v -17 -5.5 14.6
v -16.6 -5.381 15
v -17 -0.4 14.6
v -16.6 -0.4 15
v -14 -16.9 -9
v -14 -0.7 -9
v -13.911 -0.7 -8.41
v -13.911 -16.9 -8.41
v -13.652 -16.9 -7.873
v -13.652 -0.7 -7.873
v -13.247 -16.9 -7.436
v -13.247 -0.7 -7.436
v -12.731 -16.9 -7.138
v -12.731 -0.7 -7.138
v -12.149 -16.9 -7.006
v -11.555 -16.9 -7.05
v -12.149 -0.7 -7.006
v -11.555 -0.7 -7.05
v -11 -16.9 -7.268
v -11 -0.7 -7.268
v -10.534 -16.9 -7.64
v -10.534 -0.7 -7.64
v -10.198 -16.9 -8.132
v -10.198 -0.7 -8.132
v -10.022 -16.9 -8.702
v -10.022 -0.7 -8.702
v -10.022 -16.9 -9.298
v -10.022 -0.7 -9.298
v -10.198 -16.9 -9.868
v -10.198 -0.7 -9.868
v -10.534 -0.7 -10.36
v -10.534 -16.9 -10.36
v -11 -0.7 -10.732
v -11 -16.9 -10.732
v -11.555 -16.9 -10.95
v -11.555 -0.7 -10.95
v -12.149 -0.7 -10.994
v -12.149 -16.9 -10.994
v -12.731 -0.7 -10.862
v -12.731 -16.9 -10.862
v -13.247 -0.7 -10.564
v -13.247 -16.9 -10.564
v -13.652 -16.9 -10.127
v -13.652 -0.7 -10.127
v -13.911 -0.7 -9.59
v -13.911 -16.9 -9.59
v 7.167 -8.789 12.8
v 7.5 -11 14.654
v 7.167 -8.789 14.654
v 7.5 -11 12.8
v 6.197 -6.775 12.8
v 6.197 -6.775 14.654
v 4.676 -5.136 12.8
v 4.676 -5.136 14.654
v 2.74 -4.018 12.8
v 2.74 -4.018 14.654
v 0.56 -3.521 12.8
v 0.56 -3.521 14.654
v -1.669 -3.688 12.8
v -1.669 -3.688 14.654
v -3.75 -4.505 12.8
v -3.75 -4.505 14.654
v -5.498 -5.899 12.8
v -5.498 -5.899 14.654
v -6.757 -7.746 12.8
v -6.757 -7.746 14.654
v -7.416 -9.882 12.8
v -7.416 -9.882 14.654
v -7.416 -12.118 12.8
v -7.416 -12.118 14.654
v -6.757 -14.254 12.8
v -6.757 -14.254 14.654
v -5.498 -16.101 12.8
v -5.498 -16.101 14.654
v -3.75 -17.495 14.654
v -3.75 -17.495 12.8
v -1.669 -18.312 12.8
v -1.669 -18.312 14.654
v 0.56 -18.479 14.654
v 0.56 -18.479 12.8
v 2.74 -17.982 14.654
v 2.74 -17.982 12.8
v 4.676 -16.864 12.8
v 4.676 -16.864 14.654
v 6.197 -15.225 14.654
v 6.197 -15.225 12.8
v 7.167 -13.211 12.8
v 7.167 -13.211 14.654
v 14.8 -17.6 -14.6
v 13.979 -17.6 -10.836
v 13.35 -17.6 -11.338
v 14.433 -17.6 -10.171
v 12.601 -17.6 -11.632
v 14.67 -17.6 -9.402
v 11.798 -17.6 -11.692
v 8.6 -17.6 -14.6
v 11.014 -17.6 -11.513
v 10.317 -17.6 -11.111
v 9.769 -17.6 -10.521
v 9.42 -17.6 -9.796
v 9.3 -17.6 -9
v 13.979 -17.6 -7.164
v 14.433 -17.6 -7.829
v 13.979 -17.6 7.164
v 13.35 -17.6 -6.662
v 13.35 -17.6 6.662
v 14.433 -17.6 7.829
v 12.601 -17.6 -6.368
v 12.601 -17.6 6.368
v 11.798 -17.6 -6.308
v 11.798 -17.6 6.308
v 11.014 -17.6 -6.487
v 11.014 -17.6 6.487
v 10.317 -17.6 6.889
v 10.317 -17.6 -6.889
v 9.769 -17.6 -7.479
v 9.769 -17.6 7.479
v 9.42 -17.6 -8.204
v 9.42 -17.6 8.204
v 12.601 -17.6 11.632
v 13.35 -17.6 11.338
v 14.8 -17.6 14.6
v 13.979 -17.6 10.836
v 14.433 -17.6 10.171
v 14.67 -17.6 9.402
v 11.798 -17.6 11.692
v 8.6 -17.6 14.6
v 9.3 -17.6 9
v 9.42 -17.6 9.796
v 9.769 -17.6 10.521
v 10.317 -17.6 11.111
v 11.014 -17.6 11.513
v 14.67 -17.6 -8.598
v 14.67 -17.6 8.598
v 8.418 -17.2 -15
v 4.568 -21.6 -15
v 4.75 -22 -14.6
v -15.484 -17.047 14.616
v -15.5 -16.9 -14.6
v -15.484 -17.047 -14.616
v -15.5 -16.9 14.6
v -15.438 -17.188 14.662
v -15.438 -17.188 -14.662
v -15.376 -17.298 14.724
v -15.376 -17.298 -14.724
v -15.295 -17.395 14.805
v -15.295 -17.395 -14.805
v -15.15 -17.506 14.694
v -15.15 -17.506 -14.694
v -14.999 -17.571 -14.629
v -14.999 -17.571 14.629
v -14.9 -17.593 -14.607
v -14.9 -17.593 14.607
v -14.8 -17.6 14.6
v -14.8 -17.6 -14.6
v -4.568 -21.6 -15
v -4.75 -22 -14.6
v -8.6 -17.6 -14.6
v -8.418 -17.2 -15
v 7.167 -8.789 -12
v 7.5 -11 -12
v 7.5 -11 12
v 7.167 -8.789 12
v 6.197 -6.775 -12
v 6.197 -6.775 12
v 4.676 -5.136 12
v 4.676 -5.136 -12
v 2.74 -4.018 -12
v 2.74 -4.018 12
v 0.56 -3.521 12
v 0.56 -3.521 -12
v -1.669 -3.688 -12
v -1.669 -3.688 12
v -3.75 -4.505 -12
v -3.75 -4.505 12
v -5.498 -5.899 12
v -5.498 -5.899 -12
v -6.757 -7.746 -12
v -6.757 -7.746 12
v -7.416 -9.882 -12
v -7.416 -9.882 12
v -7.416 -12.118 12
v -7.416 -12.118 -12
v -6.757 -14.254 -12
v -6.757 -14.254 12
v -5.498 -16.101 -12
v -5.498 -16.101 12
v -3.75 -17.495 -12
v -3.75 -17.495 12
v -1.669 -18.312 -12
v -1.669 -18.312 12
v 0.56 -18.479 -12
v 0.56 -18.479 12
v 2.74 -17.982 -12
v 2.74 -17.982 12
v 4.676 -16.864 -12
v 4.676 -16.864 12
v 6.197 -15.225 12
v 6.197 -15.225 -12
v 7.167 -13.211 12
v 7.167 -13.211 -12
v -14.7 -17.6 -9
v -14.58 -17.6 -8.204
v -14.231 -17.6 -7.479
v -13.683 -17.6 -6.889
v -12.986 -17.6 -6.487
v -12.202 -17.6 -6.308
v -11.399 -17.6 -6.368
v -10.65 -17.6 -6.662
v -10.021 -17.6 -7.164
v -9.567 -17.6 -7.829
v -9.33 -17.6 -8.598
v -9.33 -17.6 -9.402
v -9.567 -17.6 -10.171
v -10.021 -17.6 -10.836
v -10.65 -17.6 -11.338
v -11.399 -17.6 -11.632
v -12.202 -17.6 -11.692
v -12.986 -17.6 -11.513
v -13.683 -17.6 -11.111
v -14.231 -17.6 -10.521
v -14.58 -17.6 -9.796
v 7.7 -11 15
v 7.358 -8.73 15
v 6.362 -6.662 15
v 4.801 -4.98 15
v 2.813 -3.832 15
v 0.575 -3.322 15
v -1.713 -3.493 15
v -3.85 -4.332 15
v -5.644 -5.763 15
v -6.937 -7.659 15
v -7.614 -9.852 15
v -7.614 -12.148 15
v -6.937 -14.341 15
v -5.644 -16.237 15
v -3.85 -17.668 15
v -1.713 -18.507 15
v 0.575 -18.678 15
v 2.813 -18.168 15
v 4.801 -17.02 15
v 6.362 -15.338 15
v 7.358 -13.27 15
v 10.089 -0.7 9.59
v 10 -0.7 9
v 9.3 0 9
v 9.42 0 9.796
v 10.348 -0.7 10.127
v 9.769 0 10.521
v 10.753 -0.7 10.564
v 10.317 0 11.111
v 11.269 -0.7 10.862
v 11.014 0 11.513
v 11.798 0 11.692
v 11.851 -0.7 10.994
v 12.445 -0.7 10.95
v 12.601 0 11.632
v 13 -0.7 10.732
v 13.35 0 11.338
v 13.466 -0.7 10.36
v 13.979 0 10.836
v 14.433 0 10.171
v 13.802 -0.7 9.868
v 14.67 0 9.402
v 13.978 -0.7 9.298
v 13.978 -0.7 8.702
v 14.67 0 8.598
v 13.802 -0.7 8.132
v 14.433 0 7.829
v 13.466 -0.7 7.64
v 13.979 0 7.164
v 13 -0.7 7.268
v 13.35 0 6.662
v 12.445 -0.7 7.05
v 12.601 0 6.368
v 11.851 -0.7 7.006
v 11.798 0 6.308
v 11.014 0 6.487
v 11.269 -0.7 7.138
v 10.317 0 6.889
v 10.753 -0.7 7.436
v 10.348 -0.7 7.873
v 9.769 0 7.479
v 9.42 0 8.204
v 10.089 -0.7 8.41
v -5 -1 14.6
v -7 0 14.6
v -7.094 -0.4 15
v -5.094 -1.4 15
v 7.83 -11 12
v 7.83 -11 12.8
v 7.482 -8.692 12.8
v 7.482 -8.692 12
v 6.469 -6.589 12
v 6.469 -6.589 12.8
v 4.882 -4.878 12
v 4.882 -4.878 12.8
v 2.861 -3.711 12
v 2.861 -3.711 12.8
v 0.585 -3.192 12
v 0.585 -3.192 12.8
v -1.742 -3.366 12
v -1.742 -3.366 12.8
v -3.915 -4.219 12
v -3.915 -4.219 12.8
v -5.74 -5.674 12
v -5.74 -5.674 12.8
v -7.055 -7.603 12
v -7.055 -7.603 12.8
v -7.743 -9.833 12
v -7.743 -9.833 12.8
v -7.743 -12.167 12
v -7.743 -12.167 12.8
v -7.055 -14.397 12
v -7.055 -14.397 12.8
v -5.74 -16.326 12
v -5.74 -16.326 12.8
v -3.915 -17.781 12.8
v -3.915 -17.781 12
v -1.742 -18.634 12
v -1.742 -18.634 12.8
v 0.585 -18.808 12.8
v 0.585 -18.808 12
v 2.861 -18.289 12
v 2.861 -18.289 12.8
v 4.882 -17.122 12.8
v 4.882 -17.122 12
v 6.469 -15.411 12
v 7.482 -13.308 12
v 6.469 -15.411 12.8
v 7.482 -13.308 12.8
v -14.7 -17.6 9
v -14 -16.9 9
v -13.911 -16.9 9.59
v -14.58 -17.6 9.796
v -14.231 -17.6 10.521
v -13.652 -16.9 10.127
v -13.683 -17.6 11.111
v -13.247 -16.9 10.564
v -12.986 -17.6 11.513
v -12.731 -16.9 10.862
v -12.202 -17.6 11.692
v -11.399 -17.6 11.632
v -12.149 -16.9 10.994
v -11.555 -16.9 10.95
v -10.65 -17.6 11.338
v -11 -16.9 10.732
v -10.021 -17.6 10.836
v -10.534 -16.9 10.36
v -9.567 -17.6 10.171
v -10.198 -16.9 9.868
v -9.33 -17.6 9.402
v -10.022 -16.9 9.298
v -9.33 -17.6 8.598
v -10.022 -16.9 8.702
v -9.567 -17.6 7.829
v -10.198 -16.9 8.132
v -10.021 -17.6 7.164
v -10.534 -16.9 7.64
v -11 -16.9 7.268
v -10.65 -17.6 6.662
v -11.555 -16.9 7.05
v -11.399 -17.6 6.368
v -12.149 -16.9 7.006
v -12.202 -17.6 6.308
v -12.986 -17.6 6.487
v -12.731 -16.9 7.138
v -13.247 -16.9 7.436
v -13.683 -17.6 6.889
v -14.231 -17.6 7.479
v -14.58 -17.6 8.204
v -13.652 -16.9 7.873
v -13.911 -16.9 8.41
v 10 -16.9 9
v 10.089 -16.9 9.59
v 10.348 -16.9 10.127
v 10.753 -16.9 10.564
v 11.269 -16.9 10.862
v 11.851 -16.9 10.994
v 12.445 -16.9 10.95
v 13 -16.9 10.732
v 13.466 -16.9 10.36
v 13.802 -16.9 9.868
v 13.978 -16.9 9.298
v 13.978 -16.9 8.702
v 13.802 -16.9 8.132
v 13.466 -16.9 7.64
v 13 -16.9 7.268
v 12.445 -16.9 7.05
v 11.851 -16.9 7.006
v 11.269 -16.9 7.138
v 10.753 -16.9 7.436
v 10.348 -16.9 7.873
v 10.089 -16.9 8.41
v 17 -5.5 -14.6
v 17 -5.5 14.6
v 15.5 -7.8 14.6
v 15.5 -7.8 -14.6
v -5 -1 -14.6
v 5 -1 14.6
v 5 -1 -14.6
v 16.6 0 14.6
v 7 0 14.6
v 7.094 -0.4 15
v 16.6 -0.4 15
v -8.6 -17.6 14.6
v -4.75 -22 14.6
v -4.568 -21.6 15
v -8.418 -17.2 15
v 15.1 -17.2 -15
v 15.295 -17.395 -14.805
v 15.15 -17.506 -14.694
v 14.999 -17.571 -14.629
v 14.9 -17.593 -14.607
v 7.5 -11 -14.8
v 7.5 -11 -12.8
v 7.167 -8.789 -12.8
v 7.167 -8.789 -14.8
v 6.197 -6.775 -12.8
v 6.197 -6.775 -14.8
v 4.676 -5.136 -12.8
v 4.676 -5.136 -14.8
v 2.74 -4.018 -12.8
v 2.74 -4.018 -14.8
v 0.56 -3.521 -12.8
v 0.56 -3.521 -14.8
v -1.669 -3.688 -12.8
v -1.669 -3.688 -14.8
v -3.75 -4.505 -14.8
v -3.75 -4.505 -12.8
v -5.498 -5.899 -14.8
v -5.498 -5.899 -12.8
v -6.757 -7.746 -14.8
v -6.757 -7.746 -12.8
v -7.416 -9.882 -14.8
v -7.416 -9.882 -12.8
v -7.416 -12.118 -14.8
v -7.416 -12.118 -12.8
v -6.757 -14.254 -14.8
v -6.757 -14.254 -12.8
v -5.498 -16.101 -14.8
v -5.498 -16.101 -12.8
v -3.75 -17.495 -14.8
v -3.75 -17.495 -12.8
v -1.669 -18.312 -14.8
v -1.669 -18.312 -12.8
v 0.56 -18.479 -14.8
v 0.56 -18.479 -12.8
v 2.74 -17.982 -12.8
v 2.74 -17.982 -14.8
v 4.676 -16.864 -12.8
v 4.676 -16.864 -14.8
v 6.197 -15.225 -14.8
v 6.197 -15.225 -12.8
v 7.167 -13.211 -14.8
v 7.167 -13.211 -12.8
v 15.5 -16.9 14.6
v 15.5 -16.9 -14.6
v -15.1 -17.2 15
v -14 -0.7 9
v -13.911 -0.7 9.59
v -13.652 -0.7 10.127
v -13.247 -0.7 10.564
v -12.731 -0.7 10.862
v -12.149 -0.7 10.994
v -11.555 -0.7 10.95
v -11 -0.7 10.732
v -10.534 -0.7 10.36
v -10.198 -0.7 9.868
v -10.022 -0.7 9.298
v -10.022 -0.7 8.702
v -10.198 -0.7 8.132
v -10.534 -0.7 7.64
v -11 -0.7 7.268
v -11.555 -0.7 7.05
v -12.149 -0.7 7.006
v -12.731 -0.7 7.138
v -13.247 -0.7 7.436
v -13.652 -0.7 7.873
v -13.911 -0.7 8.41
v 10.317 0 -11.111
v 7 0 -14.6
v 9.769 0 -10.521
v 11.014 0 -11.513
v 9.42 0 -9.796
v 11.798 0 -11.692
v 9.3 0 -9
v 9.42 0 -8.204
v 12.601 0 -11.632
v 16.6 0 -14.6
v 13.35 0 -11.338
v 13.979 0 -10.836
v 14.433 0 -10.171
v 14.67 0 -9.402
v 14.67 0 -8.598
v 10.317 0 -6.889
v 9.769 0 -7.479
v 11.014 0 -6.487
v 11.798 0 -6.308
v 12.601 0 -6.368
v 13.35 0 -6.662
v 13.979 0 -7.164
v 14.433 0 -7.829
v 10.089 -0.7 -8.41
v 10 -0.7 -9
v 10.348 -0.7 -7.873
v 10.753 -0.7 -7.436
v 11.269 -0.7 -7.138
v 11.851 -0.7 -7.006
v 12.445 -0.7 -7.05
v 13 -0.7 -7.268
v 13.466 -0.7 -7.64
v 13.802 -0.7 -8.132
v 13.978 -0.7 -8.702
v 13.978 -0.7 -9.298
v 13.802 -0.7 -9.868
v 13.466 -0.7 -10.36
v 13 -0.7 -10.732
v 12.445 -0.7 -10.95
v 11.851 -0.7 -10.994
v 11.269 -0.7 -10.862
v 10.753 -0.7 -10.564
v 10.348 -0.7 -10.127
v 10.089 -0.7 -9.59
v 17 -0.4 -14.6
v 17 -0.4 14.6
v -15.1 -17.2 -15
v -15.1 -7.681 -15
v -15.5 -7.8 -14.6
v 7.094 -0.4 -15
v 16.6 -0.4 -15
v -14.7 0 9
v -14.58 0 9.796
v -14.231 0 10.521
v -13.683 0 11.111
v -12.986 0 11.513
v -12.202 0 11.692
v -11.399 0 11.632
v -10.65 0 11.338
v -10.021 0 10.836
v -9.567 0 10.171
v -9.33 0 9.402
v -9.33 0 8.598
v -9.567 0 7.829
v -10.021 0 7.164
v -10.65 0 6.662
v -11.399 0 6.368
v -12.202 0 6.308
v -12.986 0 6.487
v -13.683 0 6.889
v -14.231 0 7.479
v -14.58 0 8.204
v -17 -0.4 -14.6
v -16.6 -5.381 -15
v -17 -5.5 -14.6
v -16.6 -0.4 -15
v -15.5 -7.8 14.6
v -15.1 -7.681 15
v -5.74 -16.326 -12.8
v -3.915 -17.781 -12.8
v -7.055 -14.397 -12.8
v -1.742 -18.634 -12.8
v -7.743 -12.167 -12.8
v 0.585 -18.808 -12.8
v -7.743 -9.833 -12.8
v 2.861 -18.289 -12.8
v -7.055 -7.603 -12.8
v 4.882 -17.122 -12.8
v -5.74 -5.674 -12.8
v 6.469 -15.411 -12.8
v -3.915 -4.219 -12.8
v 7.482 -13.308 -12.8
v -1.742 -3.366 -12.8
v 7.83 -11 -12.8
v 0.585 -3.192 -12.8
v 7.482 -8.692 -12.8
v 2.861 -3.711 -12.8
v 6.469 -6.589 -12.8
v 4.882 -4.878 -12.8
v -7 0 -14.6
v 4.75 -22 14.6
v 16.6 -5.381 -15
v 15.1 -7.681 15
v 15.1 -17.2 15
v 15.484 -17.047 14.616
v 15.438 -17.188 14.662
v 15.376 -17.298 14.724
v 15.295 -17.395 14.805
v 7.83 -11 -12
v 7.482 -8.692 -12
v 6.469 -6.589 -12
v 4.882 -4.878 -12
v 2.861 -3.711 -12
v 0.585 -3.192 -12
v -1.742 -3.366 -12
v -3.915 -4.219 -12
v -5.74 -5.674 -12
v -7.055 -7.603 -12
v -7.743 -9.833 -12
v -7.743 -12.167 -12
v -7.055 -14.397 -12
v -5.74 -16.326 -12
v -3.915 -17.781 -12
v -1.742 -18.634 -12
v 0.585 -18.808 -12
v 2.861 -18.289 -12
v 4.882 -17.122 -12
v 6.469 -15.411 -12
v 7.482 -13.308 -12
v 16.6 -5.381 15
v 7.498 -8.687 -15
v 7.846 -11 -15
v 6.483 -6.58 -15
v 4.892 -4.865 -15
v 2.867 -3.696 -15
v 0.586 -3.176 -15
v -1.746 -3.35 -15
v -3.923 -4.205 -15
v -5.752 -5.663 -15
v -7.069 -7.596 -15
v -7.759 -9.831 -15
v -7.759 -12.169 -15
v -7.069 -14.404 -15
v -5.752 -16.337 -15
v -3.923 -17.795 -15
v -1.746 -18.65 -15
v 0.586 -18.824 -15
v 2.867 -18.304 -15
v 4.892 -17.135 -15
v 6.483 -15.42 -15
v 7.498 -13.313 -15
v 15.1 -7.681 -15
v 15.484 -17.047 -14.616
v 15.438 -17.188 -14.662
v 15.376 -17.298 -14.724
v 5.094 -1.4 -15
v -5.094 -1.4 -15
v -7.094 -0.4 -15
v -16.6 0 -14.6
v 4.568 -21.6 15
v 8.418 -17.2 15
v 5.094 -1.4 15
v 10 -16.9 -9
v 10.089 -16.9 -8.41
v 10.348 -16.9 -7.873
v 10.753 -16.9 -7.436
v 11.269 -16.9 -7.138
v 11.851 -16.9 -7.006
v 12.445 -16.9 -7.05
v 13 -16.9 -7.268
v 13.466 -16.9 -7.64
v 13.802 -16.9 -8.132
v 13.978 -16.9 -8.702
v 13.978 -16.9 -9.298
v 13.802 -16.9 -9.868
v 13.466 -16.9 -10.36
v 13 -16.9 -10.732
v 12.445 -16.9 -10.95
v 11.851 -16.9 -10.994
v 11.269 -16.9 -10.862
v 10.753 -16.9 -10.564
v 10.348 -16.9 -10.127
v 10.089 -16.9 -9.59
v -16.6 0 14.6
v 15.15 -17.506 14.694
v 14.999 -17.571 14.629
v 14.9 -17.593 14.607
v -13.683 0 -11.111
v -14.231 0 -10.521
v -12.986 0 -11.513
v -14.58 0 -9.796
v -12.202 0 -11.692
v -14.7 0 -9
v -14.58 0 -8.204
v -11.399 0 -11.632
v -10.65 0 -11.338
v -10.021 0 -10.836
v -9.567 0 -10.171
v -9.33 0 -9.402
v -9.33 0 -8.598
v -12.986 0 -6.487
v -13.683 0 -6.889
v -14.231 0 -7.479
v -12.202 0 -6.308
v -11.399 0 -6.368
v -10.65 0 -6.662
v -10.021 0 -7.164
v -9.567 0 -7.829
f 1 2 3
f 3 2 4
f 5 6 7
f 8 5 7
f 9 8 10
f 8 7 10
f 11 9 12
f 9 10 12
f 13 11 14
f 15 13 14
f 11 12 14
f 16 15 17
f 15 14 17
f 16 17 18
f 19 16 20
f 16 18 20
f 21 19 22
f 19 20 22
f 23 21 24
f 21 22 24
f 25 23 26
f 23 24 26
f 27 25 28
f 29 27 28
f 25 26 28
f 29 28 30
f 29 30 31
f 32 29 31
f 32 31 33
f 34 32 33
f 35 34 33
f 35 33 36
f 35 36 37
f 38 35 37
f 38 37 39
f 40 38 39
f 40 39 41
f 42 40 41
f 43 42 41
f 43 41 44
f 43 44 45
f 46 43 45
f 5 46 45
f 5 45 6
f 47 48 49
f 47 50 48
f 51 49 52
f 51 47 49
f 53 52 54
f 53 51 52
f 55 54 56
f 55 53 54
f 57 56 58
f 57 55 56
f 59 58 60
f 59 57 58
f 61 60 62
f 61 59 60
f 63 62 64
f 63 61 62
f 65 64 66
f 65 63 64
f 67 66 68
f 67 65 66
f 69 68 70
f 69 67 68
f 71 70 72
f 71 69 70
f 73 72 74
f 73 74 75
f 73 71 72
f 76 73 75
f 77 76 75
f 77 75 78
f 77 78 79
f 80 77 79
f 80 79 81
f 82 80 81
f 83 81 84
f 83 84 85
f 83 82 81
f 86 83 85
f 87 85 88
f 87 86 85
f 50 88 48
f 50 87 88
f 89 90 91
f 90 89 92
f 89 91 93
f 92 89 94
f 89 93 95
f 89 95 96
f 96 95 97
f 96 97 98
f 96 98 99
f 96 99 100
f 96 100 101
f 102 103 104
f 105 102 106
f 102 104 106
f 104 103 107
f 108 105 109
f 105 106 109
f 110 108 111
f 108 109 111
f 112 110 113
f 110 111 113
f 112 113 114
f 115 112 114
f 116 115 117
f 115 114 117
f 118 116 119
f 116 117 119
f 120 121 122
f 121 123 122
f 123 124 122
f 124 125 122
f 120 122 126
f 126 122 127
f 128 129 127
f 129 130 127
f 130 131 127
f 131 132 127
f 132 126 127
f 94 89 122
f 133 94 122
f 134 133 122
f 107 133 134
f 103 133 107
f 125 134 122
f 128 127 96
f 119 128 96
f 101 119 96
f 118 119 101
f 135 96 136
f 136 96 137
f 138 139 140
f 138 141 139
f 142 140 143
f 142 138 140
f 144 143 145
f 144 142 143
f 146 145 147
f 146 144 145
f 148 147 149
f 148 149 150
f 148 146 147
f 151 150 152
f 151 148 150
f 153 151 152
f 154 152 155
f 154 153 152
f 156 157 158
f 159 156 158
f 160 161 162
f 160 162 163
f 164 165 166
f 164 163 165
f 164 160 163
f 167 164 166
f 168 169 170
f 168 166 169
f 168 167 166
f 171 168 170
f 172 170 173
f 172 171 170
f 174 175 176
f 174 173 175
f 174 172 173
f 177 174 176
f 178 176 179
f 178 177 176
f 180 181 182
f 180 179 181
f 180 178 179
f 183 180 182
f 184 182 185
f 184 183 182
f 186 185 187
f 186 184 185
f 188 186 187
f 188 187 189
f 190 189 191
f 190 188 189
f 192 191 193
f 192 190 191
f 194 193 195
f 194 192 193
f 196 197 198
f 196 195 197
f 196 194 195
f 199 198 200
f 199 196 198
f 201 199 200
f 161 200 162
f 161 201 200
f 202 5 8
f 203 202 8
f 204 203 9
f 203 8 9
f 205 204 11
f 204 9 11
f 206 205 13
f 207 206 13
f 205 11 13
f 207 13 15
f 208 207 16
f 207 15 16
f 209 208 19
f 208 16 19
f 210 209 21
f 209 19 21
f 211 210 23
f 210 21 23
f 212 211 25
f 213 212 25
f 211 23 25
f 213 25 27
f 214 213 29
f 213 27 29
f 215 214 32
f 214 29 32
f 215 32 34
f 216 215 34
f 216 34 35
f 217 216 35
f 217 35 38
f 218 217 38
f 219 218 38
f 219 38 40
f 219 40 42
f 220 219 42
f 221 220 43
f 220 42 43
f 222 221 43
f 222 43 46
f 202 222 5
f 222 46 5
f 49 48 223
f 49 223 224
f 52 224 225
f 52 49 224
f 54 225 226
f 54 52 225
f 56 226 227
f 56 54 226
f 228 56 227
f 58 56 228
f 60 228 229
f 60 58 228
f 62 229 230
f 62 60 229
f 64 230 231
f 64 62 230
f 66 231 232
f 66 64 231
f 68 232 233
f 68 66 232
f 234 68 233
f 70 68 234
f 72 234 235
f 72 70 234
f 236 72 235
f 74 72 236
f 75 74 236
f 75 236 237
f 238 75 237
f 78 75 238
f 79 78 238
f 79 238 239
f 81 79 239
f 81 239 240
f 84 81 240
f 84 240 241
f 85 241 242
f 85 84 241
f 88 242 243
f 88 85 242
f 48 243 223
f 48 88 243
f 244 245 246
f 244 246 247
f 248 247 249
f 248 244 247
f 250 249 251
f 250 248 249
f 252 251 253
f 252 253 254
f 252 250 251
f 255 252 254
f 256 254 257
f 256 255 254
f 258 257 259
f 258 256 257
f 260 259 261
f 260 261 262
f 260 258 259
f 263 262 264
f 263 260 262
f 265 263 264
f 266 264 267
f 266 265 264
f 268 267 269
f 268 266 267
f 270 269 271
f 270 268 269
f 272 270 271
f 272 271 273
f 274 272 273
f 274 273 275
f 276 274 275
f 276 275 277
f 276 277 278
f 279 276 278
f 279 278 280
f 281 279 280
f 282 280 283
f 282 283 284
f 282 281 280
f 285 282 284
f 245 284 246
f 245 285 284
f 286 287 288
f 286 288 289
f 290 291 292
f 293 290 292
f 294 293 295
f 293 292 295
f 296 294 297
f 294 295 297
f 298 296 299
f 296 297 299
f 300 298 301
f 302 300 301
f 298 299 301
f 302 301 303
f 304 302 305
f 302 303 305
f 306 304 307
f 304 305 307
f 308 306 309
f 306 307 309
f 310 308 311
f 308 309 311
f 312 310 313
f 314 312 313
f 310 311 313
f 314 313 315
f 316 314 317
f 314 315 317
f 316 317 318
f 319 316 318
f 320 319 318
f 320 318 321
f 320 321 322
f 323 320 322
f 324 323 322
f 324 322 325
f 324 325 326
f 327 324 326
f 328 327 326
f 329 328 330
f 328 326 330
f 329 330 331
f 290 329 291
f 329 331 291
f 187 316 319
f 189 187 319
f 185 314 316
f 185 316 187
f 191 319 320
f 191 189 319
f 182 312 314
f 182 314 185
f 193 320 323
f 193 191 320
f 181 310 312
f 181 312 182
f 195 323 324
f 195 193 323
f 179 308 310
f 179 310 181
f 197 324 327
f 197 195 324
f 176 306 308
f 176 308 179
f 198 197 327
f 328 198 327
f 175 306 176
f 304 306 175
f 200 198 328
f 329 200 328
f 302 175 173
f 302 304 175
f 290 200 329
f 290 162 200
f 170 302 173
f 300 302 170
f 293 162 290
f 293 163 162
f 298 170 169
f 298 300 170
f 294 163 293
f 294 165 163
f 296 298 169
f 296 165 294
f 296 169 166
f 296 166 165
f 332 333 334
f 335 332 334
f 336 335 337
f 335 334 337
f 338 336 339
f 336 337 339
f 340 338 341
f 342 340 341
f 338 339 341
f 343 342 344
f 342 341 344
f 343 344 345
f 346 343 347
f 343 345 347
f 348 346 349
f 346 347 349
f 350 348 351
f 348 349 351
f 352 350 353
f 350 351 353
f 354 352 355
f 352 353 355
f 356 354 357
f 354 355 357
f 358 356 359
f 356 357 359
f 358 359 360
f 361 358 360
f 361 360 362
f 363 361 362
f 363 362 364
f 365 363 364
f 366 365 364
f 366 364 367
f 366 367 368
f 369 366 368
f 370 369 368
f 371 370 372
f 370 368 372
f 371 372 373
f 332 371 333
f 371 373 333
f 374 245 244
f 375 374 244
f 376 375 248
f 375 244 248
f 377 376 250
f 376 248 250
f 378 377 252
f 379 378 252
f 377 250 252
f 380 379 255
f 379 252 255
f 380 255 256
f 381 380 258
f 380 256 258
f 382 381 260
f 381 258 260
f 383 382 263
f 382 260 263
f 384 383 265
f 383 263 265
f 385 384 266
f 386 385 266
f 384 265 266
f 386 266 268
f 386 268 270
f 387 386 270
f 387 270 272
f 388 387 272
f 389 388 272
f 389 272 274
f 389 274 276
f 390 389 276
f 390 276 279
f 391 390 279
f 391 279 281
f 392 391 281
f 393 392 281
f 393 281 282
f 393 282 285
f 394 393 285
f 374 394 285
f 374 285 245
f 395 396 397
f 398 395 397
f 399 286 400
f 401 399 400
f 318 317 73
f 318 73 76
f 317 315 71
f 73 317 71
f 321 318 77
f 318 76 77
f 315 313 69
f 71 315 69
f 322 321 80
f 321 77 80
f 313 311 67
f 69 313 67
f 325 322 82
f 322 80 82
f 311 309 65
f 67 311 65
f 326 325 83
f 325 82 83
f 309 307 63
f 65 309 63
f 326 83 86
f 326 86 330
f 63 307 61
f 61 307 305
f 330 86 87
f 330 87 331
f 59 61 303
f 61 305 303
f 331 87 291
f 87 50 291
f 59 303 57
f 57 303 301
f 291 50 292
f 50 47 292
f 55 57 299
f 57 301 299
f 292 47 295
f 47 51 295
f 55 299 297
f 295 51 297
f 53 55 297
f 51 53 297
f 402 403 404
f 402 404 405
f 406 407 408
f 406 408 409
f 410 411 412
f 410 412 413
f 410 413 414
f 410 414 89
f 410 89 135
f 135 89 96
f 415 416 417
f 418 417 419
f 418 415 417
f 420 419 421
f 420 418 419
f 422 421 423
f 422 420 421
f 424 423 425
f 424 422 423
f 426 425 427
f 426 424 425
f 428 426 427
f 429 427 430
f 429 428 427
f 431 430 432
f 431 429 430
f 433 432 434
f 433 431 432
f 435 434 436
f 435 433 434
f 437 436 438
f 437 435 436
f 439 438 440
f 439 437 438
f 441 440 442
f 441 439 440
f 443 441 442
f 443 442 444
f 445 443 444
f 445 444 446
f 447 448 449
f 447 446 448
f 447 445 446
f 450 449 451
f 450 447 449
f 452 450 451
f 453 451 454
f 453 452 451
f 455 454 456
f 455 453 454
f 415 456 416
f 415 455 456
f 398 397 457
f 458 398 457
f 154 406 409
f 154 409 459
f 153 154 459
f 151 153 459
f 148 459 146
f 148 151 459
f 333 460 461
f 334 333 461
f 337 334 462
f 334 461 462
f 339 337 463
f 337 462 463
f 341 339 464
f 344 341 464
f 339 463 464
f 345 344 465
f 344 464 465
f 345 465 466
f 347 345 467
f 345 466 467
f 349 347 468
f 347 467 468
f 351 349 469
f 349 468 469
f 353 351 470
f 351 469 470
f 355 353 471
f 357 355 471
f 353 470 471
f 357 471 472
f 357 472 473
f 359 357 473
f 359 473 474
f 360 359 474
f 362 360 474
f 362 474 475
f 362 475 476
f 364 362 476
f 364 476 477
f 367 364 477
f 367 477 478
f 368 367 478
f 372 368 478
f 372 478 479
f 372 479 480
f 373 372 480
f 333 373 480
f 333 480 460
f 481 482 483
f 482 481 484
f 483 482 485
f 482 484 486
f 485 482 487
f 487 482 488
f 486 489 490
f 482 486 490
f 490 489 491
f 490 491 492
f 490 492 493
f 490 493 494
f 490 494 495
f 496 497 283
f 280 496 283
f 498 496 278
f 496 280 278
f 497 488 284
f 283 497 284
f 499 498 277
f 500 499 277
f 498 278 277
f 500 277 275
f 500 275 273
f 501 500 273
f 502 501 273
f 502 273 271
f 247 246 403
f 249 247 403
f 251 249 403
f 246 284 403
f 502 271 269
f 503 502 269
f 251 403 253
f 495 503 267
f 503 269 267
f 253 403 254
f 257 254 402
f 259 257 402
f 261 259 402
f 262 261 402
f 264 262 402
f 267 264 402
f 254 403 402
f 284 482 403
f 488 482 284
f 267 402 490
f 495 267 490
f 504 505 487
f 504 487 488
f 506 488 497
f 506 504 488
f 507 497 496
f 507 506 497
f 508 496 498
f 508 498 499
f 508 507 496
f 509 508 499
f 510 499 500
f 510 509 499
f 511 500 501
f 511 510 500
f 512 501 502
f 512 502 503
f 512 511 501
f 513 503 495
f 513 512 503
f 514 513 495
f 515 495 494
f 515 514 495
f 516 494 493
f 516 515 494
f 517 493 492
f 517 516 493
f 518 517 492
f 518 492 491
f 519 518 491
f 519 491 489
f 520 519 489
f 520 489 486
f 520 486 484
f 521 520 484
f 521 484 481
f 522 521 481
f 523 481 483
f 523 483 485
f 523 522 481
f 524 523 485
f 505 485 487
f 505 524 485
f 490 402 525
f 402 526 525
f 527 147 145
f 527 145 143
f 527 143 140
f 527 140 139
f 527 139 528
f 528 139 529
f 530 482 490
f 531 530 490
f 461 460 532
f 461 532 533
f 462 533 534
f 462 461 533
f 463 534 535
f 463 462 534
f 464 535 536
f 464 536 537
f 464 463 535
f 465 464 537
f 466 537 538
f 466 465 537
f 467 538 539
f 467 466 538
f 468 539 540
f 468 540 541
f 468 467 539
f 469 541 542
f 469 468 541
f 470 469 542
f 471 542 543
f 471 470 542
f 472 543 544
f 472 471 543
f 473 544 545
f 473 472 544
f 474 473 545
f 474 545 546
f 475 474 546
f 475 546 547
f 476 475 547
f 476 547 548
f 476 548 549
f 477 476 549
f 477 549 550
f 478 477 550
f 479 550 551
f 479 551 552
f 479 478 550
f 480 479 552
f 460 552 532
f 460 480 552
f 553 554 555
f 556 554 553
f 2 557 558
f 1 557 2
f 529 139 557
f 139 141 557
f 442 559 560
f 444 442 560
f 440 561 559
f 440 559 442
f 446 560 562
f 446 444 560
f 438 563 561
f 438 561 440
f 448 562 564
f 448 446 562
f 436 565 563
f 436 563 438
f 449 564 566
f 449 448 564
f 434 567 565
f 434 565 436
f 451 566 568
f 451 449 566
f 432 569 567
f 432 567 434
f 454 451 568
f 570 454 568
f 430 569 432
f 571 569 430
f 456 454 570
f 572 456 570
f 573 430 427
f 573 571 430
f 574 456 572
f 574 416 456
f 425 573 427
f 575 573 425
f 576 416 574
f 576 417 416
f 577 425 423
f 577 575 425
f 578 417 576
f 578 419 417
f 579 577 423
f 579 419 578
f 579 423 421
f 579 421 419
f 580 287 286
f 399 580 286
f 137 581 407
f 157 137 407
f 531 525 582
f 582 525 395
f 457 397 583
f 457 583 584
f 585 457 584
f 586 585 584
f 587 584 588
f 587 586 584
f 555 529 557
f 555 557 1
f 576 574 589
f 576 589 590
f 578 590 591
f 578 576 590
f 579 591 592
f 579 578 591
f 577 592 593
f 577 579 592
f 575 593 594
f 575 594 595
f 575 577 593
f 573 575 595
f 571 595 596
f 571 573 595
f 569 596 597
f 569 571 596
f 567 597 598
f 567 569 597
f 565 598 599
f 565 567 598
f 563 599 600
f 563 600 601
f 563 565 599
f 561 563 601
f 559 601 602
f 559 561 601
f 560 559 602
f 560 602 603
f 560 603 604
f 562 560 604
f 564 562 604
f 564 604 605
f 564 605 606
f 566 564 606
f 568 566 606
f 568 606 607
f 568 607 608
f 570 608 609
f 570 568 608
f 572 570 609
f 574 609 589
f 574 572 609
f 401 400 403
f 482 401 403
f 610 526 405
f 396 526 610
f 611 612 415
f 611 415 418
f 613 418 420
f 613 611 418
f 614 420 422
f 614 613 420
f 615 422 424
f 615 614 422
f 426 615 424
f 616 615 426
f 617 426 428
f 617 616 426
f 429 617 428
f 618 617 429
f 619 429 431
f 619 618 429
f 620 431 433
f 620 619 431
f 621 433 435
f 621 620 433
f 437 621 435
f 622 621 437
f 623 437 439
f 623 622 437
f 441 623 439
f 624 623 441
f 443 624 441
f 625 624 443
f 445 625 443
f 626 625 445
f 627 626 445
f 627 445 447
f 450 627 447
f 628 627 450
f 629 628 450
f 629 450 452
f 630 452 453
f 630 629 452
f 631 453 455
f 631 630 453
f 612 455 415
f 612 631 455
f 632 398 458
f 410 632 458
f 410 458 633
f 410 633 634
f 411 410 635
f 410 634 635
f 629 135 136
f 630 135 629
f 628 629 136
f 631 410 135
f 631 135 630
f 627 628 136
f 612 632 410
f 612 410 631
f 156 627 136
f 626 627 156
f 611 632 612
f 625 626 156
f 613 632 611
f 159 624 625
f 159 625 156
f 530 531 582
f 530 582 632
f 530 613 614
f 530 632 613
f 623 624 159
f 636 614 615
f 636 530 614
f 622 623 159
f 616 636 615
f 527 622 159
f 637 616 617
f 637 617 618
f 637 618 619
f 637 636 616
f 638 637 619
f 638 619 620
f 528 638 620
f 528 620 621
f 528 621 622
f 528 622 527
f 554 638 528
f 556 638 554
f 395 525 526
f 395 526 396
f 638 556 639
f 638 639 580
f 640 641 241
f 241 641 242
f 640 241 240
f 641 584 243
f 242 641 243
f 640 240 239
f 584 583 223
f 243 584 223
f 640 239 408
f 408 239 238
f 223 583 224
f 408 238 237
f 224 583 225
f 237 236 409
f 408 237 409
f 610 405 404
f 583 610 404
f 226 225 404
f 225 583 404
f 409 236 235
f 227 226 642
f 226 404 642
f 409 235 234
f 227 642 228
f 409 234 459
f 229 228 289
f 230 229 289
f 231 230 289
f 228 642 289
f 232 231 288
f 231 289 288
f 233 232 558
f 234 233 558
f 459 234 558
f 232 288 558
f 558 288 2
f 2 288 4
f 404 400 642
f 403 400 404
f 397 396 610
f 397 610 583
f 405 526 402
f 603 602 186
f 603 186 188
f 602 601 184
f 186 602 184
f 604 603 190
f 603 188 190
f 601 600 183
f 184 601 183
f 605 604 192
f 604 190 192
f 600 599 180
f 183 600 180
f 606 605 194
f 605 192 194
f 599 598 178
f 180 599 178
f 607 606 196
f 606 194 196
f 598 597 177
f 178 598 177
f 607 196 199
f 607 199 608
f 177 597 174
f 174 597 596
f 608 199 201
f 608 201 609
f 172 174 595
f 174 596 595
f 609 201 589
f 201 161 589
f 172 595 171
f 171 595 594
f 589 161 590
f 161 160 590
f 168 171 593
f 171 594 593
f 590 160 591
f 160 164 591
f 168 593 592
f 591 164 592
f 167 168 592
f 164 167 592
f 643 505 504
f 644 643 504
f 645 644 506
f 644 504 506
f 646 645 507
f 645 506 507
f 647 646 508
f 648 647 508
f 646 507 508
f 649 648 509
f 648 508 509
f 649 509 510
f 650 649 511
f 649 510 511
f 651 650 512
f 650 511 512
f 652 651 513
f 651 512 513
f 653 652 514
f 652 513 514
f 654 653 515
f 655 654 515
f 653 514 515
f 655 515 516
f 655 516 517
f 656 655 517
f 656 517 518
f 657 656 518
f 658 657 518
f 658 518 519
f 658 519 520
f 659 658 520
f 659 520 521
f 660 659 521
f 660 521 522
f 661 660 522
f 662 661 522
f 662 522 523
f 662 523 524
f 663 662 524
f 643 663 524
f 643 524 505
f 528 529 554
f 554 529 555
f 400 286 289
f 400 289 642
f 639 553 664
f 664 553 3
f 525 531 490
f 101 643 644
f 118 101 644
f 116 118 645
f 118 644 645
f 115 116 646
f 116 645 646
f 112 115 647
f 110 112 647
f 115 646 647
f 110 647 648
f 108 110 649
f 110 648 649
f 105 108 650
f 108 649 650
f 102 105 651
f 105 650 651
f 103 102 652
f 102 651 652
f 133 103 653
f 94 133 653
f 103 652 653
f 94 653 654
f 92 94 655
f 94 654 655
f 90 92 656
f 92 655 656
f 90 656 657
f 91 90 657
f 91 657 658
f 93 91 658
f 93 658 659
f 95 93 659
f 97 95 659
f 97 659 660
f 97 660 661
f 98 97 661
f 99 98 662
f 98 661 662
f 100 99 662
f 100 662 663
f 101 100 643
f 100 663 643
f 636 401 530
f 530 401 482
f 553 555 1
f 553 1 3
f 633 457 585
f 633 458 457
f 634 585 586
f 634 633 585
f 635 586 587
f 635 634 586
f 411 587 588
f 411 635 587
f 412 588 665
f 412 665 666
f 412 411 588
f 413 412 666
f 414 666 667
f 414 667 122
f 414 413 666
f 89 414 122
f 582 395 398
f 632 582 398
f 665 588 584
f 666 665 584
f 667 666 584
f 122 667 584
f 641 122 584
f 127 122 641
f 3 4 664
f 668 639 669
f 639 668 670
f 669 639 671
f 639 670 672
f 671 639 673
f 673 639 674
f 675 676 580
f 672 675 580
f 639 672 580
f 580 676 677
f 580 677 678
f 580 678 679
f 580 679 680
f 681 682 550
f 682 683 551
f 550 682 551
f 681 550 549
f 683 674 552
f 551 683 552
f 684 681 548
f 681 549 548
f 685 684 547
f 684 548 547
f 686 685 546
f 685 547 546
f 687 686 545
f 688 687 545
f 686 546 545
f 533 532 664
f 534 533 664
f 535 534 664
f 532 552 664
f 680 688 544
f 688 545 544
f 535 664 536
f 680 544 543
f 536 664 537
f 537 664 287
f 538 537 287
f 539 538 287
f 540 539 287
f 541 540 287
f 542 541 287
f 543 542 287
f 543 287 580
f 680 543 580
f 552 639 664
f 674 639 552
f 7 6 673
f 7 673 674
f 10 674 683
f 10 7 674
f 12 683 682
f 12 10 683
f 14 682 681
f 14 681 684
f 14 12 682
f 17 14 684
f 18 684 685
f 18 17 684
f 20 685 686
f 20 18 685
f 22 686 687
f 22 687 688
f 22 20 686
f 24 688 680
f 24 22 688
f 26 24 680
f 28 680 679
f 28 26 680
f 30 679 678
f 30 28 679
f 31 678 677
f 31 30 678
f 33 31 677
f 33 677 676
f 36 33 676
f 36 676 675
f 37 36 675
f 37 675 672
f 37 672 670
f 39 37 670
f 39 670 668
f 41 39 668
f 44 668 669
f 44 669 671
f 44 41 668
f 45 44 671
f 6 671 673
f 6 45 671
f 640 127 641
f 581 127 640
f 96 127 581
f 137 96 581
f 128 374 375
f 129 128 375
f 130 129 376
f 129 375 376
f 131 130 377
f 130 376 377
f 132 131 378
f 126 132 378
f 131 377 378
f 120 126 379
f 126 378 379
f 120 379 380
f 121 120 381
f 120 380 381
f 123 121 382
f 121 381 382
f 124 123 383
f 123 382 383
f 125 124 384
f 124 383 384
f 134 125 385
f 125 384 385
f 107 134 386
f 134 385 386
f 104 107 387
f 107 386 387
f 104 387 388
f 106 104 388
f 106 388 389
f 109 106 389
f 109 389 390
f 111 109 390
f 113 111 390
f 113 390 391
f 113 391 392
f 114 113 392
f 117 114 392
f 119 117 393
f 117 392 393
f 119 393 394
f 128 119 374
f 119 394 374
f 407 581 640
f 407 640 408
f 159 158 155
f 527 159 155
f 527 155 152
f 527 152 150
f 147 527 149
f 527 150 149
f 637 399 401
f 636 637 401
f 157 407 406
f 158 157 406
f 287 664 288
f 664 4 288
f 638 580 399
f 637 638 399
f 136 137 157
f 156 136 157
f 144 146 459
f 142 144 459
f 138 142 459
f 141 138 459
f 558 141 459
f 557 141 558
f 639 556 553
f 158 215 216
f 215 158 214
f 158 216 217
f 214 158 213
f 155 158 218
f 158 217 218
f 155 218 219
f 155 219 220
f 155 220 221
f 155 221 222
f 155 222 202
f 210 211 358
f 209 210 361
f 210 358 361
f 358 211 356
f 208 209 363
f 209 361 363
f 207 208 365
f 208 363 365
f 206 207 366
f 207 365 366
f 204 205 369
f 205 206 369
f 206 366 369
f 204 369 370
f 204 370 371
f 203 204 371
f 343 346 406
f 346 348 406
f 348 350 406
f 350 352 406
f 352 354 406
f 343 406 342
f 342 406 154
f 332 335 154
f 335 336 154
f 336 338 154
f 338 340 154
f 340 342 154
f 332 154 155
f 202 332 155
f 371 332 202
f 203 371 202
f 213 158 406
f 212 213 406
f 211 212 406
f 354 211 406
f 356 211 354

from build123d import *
from OCP.BRepFilletAPI import BRepFilletAPI_MakeChamfer

# Parameters (mm, degrees)
SKETCH1_R             = 7.5
BOSS_EXTRUDE1_DEPTH   = 15
CHAFL_N0_SIZE         = 0.2
CHAFL_N0_SIZE2        = 0.346410162
CROQUIS1_R            = 2
CORTAR_EXTRUIR1_DEPTH = 20
CHAFL_N1_SIZE         = 0.7
CHAFL_N2_SIZE         = 0.4
REDONDEO1_R           = 0.7
SKETCH2_R             = 7.83
CUT_EXTRUDE1_DEPTH    = 0.8


with BuildPart() as part:
    # Sketch1 → Boss-Extrude1 (new, symmetric)
    with BuildSketch(Plane.XY):
        Polygon((-5, -1), (5, -1), (7, 0), (17, 0), (17, -5.5), (15.5, -7.8), (15.5, -17.6), (8.6, -17.6), (4.75, -22), (-4.75, -22), (-8.6, -17.6), (-15.5, -17.6), (-15.5, -7.8), (-17, -5.5), (-17, 0), (-7, 0), align=None)
        with Locations((0, -11)):
            Circle(SKETCH1_R, mode=Mode.SUBTRACT)
    extrude(amount=BOSS_EXTRUDE1_DEPTH, both=True)

    # Chaflàn0: one chamfer whose edges measure the first distance from different faces: ONE call of the kernel's chamfer builder (chamfer() names one face for all edges)
    chafl_n0_edges_1 = [part.edges().sort_by_distance(p)[0] for p in [
        (-7.5, -11, -15),
    ]]
    chafl_n0_side_1 = [part.faces().sort_by_distance(p)[0] for p in [
        (-7.5, -11, 0),
    ]]
    chafl_n0_edges_2 = [part.edges().sort_by_distance(p)[0] for p in [
        (-7.5, -11, 15),
    ]]
    chafl_n0_side_2 = [part.faces().sort_by_distance(p)[0] for p in [
        (0, -1.404969135, 15),
    ]]
    chafl_n0 = BRepFilletAPI_MakeChamfer(part.part.solid().wrapped)
    for e in chafl_n0_edges_1:
        chafl_n0.Add(CHAFL_N0_SIZE, CHAFL_N0_SIZE2, e.wrapped, chafl_n0_side_1[0].wrapped)  # the first distance lies on this face
    for e in chafl_n0_edges_2:
        chafl_n0.Add(CHAFL_N0_SIZE, CHAFL_N0_SIZE2, e.wrapped, chafl_n0_side_2[0].wrapped)  # the first distance lies on this face
    add(Compound.cast(chafl_n0.Shape()), mode=Mode.REPLACE)

    # Croquis1 → Cortar-Extruir1 (cut)
    with BuildSketch(Plane(origin=(0, 0, 0), x_dir=(1, 0, 0), z_dir=(0, 1, 0))):
        with Locations(Location((-12, 9, 0), (0, 0, 180))):
            Circle(CROQUIS1_R)
        with Locations(Location((12, 9, 0), (0, 0, 180))):
            Circle(CROQUIS1_R)
        with Locations(Location((-12, -9, 0), (0, 0, 180))):
            Circle(CROQUIS1_R)
        with Locations(Location((12, -9, 0), (0, 0, 180))):
            Circle(CROQUIS1_R)
    extrude(amount=-CORTAR_EXTRUIR1_DEPTH, mode=Mode.SUBTRACT)

    # Chaflán1
    chafl_n1_edges = [part.edges().sort_by_distance(p)[0] for p in [
        (-10, -17.6, -9),
        (-10, 0, -9),
        (14, -17.6, -9),
        (14, 0, -9),
        (-10, -17.6, 9),
        (-10, 0, 9),
        (14, -17.6, 9),
        (14, 0, 9),
    ]]
    chamfer(chafl_n1_edges, length=CHAFL_N1_SIZE)

    # Chaflán2
    chafl_n2_edges = [part.edges().sort_by_distance(p)[0] for p in [
        (-6, -0.5, 15),
        (-12, 0, 15),
        (12, 0, -15),
        (17, -2.75, -15),
        (16.25, -6.65, -15),
        (15.5, -12.7, -15),
        (12.05, -17.6, -15),
        (-17, -2.75, 15),
        (6.675, -19.8, -15),
        (0, -22, -15),
        (-6.675, -19.8, -15),
        (-12.05, -17.6, -15),
        (-15.5, -12.7, -15),
        (-16.25, -6.65, -15),
        (-17, -2.75, -15),
        (-12, 0, -15),
        (-16.25, -6.65, 15),
        (-6, -0.5, -15),
        (0, -1, -15),
        (6, -0.5, -15),
        (-15.5, -12.7, 15),
        (-12.05, -17.6, 15),
        (17, 0, 0),
        (-17, 0, 0),
        (-6.675, -19.8, 15),
        (0, -22, 15),
        (6.675, -19.8, 15),
        (12.05, -17.6, 15),
        (6, -0.5, 15),
        (15.5, -12.7, 15),
        (16.25, -6.65, 15),
        (17, -2.75, 15),
        (12, 0, 15),
        (0, -1, 15),
    ]]
    chamfer(chafl_n2_edges, length=CHAFL_N2_SIZE)

    # Redondeo1
    redondeo1_edges = [part.edges().sort_by_distance(p)[0] for p in [
        (15.5, -17.6, 0),
        (-15.5, -17.6, 0),
    ]]
    fillet(redondeo1_edges, radius=REDONDEO1_R)

    # Sketch2 → Cut-Extrude1 (cut)
    with BuildSketch(Plane.XY.offset(12.8)):
        with Locations((0, -11)):
            Circle(SKETCH2_R)
    cut_extrude1 = extrude(amount=-CUT_EXTRUDE1_DEPTH, mode=Mode.SUBTRACT)

    # Mirror1: Cut-Extrude1 across plane
    add(cut_extrude1.mirror(Plane.XY), mode=Mode.SUBTRACT)


solid = part.part
